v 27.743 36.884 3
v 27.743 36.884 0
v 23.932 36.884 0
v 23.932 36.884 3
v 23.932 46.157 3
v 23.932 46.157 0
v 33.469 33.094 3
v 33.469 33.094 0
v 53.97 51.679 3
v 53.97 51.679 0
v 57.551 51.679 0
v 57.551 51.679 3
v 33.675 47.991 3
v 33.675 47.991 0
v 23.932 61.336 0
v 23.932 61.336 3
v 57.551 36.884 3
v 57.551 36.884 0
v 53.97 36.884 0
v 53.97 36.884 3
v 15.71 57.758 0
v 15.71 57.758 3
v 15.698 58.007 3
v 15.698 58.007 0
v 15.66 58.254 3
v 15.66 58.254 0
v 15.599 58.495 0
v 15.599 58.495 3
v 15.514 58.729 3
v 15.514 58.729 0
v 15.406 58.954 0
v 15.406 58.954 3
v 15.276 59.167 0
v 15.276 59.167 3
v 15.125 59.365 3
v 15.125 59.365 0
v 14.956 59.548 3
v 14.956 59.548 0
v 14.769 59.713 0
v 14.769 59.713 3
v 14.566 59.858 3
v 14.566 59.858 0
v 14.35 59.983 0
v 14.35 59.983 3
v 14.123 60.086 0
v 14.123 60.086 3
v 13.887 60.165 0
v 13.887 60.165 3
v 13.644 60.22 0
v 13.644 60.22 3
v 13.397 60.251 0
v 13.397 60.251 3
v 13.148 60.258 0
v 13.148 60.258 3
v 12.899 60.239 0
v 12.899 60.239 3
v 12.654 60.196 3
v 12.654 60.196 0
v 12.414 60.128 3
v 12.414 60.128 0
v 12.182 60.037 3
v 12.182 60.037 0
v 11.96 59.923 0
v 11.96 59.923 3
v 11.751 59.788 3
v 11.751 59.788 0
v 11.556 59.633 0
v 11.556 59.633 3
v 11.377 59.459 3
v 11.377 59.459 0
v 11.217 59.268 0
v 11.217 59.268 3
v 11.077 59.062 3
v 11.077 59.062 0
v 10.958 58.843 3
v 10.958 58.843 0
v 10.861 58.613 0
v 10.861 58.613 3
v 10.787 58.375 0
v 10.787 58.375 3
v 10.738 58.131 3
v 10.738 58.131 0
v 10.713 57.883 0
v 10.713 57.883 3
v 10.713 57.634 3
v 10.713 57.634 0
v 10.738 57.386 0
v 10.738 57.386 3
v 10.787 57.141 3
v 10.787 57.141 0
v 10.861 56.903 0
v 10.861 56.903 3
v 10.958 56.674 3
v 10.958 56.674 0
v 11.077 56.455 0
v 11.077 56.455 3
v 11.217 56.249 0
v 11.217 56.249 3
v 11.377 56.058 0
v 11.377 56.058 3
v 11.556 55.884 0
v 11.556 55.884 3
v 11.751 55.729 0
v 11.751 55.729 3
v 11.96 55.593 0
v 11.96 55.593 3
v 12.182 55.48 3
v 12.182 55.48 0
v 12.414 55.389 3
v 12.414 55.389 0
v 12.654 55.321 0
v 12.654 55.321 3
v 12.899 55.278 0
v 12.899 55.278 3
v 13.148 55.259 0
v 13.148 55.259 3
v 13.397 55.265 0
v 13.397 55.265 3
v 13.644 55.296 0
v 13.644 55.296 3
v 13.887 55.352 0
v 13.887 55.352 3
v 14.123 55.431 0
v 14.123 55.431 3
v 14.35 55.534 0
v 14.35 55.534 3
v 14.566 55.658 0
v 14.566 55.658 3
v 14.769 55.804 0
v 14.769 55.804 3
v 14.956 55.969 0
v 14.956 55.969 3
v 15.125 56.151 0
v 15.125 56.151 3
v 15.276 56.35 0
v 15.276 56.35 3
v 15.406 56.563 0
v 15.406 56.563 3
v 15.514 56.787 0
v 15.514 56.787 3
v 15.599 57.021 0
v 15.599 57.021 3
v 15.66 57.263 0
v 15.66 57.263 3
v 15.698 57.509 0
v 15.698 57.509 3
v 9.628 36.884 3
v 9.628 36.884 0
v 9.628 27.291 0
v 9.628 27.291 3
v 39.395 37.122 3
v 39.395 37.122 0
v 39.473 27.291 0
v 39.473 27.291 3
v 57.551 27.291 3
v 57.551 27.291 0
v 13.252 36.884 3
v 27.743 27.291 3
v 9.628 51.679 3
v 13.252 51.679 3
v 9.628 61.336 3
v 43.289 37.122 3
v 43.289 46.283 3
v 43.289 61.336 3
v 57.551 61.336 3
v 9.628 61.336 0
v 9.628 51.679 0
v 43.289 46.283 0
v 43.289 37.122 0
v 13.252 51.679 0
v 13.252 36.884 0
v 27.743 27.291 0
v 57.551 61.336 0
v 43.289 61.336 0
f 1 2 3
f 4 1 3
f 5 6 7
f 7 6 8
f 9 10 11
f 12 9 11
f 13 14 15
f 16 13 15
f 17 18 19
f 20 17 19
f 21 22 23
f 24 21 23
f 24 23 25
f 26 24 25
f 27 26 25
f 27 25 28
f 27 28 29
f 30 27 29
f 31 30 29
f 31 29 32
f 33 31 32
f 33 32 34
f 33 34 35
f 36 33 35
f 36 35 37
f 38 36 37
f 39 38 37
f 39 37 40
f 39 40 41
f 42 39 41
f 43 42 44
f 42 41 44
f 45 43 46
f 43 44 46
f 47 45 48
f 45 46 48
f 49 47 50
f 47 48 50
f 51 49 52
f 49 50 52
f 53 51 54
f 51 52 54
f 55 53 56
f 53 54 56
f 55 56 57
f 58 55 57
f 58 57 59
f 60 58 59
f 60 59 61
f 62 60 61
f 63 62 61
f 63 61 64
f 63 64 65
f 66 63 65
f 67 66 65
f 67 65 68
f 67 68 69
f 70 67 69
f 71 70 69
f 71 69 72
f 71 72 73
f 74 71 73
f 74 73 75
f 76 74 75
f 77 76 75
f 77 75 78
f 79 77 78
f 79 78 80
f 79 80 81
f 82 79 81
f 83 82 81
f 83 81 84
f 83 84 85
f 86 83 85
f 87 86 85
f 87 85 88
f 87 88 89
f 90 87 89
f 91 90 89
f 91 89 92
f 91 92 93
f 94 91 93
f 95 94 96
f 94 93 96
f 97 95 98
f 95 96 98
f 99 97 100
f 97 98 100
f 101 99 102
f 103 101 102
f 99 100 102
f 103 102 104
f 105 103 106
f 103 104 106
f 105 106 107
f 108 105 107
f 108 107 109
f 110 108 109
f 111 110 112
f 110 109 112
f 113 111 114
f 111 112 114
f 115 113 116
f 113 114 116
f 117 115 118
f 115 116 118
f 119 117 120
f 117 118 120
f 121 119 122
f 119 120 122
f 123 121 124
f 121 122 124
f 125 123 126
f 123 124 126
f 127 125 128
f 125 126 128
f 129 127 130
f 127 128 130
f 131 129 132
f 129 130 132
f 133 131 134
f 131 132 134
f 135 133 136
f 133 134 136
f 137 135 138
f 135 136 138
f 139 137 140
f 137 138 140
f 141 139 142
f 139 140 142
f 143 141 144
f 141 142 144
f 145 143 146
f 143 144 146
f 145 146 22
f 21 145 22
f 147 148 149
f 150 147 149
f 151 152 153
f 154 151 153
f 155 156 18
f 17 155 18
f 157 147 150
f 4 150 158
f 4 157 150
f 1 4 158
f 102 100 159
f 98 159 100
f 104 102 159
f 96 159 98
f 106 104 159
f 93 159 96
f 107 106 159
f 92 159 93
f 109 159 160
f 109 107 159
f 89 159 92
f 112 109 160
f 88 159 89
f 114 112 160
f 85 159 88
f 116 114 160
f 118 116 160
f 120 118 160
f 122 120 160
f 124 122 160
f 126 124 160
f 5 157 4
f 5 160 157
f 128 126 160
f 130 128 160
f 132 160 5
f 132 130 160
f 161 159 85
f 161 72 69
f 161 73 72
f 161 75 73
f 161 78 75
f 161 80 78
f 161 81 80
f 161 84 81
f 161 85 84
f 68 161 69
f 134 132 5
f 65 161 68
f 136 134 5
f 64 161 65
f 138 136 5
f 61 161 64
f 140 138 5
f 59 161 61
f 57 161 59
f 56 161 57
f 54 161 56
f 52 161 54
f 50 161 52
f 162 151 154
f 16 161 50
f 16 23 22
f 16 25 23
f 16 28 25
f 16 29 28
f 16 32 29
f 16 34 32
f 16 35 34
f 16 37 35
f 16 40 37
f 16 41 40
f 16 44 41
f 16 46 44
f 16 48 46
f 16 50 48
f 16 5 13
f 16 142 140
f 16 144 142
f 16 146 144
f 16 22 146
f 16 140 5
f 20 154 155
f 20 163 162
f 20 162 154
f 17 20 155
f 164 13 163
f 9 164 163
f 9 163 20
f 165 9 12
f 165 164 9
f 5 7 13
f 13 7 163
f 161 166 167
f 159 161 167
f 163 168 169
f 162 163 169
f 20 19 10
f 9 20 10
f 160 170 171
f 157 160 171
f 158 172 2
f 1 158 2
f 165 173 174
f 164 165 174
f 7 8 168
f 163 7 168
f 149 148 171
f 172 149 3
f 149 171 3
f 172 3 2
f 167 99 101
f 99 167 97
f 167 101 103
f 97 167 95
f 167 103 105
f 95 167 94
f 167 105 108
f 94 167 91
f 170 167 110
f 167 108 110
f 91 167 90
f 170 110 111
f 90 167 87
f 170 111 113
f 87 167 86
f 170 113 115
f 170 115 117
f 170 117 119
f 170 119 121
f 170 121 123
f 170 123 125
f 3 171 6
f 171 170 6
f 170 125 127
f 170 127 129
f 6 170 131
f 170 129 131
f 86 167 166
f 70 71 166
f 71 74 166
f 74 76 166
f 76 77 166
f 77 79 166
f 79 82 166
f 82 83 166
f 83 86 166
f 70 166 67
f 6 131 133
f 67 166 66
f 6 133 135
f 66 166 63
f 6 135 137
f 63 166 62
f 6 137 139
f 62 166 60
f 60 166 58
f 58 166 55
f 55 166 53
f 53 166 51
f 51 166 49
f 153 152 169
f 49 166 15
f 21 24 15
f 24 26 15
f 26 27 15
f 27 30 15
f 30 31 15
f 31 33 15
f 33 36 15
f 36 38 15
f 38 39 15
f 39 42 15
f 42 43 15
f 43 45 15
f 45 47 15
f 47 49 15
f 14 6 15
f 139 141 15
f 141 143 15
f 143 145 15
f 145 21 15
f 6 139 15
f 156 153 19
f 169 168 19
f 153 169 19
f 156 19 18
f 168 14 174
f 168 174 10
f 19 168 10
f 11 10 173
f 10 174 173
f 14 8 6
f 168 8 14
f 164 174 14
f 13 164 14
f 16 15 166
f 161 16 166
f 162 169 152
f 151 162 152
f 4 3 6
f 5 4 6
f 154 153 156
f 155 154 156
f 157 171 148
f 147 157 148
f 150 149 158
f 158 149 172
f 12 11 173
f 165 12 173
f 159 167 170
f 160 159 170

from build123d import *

# Parameters (mm, degrees)
F1_DEPTH = 3
F2_R     = 2.5
F3_DEPTH = 25.4


with BuildPart() as f1:
    # F0 (on Top) → F1 (new body)
    with BuildSketch(Plane.XY):
        Polygon((39.395284, 37.122335), (39.473195, 27.290761), (57.550997, 27.290761), (57.550997, 36.883935), (53.969547, 36.883935), (53.969547, 51.678739), (57.550997, 51.678739), (57.550997, 61.335869), (43.289147, 61.335869), (33.674654, 47.990695), (23.932254, 61.335869), (9.627766, 61.335869), (9.627766, 51.678739), (13.251853, 51.678739), (13.251853, 36.883935), (9.627766, 36.883935), (9.627766, 27.290761), (27.743142, 27.290761), (27.743142, 36.883935), (23.932254, 36.883935), (23.932254, 46.157219), (33.468755, 33.094085), (43.289147, 46.282709), (43.289147, 37.122335), align=None)
    extrude(amount=F1_DEPTH)

    # F2 (on face) → F3 (cut)
    with BuildSketch(Plane.XY.offset(3)):
        with Locations((13.209973, 57.75835)):
            Circle(F2_R)
    extrude(amount=-F3_DEPTH, mode=Mode.SUBTRACT)


solid = f1.part
